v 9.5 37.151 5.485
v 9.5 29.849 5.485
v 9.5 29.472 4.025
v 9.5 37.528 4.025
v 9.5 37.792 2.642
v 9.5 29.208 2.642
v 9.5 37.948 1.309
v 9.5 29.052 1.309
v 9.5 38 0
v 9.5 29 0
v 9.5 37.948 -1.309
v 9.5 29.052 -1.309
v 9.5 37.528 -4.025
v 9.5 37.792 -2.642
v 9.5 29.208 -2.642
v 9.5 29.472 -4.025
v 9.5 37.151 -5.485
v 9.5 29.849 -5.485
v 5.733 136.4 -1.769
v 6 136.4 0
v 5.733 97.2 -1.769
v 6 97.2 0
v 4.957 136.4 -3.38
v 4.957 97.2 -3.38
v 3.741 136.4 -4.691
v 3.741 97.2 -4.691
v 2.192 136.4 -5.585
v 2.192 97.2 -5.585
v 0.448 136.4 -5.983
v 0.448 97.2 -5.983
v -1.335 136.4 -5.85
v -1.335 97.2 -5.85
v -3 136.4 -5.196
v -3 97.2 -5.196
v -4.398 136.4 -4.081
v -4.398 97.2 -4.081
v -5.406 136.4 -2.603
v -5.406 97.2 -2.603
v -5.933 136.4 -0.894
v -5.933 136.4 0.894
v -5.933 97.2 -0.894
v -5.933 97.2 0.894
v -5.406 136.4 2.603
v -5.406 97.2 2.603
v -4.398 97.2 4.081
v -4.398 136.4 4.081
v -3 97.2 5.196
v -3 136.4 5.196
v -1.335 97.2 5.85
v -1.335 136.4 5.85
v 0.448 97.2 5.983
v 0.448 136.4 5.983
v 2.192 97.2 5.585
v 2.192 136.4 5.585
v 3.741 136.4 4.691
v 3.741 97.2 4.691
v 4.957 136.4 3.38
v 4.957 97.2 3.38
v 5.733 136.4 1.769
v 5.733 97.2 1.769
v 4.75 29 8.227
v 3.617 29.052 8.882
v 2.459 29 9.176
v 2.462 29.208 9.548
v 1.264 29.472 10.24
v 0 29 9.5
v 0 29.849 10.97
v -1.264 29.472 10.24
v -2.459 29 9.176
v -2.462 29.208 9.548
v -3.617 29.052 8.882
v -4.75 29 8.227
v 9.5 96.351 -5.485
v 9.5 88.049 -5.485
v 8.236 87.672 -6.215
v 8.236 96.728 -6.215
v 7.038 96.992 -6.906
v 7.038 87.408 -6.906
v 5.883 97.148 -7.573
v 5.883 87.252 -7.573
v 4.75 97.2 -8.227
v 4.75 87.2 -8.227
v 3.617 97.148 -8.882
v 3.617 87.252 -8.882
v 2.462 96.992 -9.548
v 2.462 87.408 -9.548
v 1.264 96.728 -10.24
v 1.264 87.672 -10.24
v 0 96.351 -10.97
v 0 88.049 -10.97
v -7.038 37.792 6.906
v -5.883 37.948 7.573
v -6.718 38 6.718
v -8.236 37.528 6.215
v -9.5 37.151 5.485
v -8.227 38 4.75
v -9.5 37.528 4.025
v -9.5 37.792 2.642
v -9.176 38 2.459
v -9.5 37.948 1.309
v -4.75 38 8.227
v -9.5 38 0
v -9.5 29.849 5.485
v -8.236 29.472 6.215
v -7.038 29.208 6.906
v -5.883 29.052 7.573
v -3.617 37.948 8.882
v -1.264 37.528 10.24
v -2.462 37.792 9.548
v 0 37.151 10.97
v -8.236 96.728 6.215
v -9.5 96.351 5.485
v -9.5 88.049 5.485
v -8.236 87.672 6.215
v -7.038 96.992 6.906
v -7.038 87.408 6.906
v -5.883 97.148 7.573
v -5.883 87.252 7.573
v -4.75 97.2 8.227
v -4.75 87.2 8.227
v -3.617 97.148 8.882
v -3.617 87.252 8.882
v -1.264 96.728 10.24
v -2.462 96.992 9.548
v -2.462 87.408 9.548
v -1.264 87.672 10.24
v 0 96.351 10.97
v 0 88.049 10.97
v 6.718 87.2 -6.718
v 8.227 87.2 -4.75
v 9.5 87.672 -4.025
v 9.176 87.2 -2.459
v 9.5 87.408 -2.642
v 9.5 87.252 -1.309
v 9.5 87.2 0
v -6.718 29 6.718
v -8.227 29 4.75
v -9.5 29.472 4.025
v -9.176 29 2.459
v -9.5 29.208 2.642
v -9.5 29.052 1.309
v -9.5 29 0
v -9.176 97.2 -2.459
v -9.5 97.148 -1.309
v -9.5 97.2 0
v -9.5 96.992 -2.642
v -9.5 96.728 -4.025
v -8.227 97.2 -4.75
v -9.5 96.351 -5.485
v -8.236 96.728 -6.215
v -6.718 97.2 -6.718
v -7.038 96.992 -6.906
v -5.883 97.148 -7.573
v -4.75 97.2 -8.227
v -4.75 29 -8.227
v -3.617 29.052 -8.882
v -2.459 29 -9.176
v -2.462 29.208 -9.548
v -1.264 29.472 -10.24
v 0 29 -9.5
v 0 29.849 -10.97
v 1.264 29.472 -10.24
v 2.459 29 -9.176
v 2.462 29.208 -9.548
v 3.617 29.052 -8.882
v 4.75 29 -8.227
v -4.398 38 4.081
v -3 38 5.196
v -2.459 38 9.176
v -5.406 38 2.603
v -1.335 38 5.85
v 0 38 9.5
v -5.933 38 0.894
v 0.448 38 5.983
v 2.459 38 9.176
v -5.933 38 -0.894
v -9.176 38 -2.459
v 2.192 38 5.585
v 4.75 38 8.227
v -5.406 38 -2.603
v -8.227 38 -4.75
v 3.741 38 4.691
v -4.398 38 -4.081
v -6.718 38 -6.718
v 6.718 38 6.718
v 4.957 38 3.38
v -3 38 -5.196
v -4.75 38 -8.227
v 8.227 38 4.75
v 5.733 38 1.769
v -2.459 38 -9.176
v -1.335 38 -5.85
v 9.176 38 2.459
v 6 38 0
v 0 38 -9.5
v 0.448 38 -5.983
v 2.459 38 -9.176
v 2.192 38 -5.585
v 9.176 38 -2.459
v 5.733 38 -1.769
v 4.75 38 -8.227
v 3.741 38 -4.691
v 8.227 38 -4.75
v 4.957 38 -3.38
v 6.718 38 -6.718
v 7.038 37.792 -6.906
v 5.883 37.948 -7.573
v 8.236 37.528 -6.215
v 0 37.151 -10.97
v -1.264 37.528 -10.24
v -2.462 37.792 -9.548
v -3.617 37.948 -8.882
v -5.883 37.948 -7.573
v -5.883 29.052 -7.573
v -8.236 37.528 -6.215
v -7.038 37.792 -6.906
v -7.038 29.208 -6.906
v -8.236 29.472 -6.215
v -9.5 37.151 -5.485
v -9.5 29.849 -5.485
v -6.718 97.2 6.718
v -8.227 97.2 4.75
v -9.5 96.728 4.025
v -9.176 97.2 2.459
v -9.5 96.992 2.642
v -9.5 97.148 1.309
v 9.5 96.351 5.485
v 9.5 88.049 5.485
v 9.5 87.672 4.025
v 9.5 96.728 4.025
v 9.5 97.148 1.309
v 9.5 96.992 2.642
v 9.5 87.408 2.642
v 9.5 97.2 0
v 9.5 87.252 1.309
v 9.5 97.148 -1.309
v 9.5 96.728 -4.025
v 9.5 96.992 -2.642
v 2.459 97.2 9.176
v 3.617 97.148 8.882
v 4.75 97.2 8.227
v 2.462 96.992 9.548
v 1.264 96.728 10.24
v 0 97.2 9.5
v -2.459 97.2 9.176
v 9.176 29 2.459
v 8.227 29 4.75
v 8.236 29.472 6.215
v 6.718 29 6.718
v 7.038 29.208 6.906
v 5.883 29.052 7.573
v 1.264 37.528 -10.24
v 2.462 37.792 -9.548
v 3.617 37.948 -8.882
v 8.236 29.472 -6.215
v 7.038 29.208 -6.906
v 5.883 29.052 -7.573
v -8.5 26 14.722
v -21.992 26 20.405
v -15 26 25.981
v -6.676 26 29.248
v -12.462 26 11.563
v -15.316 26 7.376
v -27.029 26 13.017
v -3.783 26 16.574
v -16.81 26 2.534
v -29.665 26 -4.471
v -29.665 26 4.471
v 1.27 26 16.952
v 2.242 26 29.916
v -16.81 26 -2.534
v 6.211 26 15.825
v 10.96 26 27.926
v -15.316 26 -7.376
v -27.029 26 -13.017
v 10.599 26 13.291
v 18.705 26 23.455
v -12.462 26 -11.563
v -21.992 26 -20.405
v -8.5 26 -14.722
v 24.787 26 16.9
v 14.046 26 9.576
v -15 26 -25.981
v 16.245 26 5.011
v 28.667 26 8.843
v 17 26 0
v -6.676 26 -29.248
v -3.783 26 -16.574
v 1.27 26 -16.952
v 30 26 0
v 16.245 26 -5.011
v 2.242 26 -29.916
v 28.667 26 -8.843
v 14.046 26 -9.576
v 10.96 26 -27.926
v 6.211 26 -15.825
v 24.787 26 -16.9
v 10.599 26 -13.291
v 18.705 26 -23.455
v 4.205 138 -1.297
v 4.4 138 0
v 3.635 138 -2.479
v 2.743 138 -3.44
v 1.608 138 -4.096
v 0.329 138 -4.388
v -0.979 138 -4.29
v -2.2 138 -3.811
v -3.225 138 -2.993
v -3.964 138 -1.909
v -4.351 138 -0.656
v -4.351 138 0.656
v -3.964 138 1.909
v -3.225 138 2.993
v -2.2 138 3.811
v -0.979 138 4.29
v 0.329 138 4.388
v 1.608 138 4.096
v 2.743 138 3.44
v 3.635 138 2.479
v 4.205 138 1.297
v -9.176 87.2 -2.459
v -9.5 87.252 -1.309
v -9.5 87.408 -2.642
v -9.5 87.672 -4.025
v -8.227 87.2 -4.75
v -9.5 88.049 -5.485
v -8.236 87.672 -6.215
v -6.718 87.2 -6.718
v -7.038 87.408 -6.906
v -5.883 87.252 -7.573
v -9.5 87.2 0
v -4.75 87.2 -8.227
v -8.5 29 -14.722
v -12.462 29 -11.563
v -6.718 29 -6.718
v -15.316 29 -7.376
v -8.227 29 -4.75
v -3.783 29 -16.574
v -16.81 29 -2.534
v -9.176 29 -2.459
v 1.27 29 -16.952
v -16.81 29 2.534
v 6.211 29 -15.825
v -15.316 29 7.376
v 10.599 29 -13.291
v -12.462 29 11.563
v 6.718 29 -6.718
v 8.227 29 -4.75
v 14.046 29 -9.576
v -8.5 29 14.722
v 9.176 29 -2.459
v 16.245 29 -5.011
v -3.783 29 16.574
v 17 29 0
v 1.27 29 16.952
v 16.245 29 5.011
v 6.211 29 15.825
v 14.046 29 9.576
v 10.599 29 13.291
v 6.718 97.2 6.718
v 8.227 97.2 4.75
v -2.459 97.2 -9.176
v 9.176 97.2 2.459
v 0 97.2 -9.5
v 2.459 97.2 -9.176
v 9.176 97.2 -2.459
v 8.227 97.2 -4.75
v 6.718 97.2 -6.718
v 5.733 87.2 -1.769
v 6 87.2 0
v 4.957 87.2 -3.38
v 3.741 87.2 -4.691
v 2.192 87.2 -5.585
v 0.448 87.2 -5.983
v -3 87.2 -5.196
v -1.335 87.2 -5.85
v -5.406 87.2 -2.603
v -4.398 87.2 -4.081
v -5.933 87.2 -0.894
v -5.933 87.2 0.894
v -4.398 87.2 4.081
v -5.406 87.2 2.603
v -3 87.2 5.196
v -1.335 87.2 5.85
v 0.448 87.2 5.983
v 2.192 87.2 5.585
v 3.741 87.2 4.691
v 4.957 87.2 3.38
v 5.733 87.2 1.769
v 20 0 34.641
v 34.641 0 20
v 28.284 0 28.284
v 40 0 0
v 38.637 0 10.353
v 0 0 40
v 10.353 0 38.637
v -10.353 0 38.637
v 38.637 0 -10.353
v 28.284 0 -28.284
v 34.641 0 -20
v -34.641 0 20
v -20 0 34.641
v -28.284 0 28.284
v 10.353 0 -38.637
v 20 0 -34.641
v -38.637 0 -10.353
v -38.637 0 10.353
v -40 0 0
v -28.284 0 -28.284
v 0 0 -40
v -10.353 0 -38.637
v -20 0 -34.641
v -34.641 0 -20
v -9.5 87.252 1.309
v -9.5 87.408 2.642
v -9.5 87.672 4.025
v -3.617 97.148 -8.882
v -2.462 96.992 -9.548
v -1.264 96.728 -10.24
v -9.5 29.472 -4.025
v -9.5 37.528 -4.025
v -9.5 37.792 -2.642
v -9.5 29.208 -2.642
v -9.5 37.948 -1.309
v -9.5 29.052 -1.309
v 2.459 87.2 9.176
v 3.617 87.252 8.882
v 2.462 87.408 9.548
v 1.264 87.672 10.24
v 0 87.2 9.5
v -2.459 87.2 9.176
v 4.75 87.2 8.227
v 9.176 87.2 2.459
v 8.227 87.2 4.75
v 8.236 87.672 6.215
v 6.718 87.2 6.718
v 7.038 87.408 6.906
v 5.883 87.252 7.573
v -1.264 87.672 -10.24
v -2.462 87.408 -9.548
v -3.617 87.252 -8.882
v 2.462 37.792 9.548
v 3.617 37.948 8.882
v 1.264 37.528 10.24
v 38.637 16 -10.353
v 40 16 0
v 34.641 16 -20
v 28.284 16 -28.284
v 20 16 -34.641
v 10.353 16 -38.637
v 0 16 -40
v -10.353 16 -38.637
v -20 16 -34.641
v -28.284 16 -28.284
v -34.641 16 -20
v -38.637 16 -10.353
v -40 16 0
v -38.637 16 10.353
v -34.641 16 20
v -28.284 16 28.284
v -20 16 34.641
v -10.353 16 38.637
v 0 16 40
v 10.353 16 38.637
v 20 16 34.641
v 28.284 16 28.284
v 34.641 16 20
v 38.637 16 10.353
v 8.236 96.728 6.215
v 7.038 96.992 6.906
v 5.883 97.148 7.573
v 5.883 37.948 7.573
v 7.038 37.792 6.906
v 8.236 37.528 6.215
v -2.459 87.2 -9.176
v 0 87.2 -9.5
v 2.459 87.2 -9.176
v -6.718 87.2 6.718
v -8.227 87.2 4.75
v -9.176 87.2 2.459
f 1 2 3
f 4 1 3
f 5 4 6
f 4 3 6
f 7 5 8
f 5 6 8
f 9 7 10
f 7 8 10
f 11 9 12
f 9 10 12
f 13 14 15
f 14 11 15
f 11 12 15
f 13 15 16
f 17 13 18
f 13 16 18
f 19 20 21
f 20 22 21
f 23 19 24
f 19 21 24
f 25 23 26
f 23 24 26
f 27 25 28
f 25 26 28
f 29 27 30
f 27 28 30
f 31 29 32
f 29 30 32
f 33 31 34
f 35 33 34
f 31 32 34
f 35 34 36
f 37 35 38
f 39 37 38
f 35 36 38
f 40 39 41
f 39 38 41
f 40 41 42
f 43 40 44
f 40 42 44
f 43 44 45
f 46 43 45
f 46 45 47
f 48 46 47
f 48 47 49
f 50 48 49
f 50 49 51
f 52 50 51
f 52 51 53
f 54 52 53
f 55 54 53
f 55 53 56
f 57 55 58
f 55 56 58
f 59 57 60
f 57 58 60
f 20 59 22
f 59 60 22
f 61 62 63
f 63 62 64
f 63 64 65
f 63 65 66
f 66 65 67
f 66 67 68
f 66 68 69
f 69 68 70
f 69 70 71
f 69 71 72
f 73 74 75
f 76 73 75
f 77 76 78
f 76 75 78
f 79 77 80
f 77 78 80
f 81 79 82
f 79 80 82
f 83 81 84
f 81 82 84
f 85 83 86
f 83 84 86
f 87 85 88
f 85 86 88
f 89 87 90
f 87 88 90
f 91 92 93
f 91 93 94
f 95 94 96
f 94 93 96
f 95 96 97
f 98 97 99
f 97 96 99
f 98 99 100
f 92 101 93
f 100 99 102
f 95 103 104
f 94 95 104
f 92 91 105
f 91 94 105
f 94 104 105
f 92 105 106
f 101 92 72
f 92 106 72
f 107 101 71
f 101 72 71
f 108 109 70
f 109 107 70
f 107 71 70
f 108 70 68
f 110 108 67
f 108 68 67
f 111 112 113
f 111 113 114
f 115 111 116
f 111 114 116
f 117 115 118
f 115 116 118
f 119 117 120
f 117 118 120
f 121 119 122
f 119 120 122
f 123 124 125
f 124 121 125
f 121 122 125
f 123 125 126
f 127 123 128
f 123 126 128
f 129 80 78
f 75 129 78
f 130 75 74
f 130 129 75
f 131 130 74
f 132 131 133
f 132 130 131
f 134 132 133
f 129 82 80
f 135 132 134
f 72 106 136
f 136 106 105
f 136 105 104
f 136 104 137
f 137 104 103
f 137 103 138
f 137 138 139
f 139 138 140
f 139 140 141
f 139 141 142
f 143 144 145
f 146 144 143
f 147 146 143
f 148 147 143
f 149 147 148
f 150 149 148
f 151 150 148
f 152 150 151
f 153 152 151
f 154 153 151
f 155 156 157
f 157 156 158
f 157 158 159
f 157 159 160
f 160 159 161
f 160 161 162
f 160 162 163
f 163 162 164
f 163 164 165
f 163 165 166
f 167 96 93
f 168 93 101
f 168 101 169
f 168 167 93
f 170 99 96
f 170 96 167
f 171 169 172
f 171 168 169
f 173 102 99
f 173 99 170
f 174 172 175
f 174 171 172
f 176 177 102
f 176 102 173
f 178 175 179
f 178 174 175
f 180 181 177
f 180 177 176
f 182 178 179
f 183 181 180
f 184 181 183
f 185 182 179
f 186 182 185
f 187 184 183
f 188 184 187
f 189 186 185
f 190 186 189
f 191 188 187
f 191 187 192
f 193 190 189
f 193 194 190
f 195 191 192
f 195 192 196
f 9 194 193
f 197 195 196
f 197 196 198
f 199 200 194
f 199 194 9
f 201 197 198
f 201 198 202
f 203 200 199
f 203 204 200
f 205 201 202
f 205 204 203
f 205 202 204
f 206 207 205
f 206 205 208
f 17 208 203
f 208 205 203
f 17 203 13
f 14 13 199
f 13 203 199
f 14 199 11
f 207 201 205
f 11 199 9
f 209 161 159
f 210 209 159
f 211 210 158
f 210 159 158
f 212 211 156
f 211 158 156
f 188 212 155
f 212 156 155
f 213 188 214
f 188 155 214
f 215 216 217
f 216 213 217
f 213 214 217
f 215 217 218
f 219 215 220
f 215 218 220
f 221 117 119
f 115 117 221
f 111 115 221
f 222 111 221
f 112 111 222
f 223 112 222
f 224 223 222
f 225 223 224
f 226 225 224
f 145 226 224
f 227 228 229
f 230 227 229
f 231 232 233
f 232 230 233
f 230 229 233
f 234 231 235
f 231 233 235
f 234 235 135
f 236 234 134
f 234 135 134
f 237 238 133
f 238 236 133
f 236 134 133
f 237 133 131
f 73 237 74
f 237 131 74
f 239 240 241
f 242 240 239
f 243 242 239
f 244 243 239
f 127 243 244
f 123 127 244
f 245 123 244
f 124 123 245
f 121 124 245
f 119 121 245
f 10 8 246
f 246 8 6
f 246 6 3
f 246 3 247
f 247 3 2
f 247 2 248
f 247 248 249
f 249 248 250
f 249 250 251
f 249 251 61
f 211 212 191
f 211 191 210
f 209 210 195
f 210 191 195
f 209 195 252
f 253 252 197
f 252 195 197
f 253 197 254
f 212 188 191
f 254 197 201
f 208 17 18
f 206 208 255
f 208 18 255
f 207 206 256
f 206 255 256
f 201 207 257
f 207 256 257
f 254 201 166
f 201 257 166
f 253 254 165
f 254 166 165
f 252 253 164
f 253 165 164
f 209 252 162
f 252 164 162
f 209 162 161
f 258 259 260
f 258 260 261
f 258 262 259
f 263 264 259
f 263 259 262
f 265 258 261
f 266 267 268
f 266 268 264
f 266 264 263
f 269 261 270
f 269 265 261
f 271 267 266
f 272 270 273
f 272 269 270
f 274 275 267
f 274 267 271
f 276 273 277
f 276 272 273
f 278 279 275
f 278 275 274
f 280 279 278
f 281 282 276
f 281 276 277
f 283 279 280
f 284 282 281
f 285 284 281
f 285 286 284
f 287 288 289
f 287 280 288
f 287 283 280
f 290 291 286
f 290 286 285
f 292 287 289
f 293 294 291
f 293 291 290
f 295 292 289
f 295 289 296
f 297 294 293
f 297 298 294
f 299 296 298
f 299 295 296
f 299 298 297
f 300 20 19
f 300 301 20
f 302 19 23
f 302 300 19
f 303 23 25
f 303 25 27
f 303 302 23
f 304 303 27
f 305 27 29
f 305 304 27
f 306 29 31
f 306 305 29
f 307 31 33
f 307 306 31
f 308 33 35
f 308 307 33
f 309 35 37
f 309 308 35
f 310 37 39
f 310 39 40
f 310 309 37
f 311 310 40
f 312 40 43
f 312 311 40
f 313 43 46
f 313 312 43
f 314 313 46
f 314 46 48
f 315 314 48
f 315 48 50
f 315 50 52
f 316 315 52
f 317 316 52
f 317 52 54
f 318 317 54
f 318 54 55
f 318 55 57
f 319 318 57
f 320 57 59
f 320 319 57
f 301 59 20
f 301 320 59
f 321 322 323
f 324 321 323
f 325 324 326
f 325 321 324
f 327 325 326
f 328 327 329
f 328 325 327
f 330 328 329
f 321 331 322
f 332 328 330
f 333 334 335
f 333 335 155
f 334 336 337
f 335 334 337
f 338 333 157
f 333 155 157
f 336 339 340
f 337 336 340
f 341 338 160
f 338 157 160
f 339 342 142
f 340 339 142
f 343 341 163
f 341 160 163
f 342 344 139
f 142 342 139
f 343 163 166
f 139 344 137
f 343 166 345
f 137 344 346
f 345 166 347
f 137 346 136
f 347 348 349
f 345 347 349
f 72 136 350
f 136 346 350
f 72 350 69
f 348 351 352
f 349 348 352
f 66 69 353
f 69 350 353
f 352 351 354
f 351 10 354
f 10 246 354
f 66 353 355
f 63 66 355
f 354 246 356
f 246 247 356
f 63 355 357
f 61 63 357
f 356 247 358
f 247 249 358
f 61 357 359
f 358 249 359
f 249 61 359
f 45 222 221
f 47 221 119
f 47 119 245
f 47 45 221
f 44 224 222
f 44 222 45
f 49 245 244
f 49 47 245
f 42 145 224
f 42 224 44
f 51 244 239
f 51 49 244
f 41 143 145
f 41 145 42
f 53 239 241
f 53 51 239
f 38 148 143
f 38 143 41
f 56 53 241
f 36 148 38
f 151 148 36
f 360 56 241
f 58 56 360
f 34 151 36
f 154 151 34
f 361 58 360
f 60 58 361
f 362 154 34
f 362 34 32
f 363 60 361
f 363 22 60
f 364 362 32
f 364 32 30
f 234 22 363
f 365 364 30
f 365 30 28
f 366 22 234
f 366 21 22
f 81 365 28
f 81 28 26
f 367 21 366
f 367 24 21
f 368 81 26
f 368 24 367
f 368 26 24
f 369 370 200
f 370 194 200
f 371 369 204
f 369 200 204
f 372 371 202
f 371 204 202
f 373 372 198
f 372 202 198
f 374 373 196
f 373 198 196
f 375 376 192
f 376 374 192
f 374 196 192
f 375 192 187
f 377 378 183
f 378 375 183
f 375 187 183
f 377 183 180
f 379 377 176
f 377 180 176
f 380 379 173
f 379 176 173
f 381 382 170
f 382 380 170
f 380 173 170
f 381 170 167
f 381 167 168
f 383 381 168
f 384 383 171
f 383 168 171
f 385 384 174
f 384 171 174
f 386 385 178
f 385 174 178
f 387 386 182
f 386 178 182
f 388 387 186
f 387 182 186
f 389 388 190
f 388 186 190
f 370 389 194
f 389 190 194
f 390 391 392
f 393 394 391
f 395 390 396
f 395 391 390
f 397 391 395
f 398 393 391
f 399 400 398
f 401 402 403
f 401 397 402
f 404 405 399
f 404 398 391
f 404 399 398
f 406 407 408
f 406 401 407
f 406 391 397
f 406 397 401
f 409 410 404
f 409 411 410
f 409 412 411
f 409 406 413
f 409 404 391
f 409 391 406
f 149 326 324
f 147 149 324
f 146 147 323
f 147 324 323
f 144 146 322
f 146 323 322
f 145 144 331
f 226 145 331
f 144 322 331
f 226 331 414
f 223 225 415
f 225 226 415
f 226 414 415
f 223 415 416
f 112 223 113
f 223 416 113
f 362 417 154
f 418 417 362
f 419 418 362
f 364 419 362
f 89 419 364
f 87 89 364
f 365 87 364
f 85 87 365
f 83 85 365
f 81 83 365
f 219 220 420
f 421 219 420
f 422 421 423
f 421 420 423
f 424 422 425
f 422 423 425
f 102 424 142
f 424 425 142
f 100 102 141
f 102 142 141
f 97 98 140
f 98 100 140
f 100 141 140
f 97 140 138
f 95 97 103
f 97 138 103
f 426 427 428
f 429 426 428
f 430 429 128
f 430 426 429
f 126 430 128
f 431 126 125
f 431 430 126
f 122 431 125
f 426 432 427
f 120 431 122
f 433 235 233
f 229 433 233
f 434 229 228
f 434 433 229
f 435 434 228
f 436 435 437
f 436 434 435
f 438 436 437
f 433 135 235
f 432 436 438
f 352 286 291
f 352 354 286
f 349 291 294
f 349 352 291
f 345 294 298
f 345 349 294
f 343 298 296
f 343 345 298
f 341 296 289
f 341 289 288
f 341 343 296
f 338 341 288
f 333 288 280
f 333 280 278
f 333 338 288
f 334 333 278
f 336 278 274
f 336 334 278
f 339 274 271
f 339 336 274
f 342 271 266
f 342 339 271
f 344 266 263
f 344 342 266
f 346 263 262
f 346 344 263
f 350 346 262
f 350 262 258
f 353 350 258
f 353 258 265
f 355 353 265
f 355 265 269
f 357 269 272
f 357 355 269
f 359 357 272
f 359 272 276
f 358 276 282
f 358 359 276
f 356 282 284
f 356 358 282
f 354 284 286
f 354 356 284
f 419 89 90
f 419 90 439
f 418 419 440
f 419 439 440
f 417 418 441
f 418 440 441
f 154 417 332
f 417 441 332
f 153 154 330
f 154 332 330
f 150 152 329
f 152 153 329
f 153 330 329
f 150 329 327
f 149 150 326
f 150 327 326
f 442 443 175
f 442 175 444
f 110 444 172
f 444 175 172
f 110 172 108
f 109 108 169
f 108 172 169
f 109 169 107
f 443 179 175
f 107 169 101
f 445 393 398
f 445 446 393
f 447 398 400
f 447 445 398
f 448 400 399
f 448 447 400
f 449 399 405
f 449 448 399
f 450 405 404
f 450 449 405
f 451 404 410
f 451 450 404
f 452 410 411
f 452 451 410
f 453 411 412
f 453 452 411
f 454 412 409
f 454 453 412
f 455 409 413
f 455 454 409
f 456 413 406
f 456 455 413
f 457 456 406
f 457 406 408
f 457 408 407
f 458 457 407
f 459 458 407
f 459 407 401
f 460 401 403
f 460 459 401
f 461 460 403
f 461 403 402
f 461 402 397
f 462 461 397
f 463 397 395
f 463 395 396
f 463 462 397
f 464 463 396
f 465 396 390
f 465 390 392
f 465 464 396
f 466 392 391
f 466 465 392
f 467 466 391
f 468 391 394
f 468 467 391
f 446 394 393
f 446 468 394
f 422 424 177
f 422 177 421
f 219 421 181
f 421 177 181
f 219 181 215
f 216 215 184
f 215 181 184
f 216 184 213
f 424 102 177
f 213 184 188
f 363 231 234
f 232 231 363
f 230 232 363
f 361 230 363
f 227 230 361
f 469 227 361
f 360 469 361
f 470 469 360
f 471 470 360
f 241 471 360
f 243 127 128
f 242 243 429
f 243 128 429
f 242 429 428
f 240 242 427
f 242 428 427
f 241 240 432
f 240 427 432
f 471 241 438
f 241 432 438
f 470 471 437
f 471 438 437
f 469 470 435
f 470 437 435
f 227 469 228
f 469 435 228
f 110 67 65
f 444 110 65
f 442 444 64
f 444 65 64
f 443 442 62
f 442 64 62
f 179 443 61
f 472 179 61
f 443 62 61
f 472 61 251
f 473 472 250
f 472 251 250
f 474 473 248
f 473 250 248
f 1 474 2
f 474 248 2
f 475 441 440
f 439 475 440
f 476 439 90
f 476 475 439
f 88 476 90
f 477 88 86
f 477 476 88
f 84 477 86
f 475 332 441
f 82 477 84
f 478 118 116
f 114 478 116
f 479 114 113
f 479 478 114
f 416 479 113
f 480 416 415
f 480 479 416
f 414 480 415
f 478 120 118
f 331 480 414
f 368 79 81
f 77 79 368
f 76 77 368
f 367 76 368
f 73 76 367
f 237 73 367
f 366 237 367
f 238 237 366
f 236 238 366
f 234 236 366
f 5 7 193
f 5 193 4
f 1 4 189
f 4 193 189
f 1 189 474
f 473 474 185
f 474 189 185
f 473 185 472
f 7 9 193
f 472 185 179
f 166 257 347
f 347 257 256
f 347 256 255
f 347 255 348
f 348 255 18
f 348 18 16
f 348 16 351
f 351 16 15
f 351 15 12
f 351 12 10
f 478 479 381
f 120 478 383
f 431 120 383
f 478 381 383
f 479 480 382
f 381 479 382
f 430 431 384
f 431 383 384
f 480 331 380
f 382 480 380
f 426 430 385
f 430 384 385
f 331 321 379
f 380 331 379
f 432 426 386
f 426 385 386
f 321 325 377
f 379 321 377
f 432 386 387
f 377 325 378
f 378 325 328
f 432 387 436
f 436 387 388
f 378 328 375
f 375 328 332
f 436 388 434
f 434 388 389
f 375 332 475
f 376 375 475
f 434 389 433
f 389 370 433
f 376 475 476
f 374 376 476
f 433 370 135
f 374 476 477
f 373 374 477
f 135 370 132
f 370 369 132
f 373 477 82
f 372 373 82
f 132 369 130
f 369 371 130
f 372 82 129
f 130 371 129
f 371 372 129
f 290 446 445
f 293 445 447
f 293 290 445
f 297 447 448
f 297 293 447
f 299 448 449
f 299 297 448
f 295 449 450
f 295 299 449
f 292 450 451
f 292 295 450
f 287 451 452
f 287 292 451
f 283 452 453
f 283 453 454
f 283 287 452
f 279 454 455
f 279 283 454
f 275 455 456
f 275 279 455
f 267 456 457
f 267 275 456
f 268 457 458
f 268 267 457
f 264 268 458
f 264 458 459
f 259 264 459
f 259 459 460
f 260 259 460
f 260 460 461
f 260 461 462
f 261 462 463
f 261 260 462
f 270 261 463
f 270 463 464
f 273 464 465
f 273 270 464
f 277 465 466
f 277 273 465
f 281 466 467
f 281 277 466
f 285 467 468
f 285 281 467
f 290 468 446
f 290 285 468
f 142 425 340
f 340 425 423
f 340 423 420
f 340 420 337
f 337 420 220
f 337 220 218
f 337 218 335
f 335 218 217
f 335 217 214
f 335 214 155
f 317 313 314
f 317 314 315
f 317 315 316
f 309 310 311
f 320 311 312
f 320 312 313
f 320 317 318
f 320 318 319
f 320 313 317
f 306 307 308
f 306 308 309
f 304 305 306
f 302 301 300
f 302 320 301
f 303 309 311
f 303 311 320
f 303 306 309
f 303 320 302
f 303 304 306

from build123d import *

# Parameters (mm, degrees)
EXTRUDE_1_DEPTH = 9
EXTRUDE_2_DEPTH = 10


with BuildPart() as part:
    # Эскиз1 → Повернуть1 (revolve)
    with BuildSketch(Plane.XY, mode=Mode.PRIVATE) as revolve_1_sk:
        Polygon((0, 0), (-40, 0), (-40, 16), (-30, 26), (-17, 26), (-17, 29), (-6, 29), (-6, 38), (-6, 136.4), (-4.4, 138), (0, 138), align=None)
    revolve(revolve_1_sk.sketch.rotate(Axis((0, 0, 0), (0, 1, 0)), 180), axis=Axis((0, 0, 0), (0, 1, 0)))  # turned: the seam where the file's is

    # Эскиз2 → Бобышка-Вытянуть1 (add)
    with BuildSketch(Plane(origin=(0, 29, 0), x_dir=(1, 0, 0), z_dir=(0, 1, 0))):
        Polygon((0, 10.969655115), (-9.5, 5.484827557), (-9.5, -5.484827557), (0, -10.969655115), (9.5, -5.484827557), (9.5, 5.484827557), align=None)
    extrude(amount=EXTRUDE_1_DEPTH)

    # Эскиз3 → Бобышка-Вытянуть2 (add)
    with BuildSketch(Plane(origin=(0, 87.2, 0), x_dir=(1, 0, 0), z_dir=(0, 1, 0))):
        Polygon((9.5, 5.484827557), (0, 10.969655115), (-9.5, 5.484827557), (-9.5, -5.484827557), (0, -10.969655115), (9.5, -5.484827557), align=None)
    extrude(amount=EXTRUDE_2_DEPTH)

    # Эскиз4 → Вырез-Повернуть2 (revolve, cut)
    with BuildSketch(Plane.XY, mode=Mode.PRIVATE) as cut_revolve_2_sk:
        Polygon((-18.160254038, 97.2), (-9.5, 97.2), (-18.160254038, 92.2), align=None)
        Polygon((-18.160254038, 87.2), (-18.160254038, 92.2), (-9.5, 87.2), align=None)
        Polygon((-17.294228634, 38), (-17.294228634, 33.5), (-9.5, 38), align=None)
        Polygon((-17.294228634, 33.5), (-17.294228634, 29), (-9.5, 29), align=None)
    revolve(cut_revolve_2_sk.sketch.rotate(Axis((0, 138, 0), (0, -1, 0)), 180), axis=Axis((0, 138, 0), (0, -1, 0)), mode=Mode.SUBTRACT)  # turned: the seam where the file's is


solid = part.part
